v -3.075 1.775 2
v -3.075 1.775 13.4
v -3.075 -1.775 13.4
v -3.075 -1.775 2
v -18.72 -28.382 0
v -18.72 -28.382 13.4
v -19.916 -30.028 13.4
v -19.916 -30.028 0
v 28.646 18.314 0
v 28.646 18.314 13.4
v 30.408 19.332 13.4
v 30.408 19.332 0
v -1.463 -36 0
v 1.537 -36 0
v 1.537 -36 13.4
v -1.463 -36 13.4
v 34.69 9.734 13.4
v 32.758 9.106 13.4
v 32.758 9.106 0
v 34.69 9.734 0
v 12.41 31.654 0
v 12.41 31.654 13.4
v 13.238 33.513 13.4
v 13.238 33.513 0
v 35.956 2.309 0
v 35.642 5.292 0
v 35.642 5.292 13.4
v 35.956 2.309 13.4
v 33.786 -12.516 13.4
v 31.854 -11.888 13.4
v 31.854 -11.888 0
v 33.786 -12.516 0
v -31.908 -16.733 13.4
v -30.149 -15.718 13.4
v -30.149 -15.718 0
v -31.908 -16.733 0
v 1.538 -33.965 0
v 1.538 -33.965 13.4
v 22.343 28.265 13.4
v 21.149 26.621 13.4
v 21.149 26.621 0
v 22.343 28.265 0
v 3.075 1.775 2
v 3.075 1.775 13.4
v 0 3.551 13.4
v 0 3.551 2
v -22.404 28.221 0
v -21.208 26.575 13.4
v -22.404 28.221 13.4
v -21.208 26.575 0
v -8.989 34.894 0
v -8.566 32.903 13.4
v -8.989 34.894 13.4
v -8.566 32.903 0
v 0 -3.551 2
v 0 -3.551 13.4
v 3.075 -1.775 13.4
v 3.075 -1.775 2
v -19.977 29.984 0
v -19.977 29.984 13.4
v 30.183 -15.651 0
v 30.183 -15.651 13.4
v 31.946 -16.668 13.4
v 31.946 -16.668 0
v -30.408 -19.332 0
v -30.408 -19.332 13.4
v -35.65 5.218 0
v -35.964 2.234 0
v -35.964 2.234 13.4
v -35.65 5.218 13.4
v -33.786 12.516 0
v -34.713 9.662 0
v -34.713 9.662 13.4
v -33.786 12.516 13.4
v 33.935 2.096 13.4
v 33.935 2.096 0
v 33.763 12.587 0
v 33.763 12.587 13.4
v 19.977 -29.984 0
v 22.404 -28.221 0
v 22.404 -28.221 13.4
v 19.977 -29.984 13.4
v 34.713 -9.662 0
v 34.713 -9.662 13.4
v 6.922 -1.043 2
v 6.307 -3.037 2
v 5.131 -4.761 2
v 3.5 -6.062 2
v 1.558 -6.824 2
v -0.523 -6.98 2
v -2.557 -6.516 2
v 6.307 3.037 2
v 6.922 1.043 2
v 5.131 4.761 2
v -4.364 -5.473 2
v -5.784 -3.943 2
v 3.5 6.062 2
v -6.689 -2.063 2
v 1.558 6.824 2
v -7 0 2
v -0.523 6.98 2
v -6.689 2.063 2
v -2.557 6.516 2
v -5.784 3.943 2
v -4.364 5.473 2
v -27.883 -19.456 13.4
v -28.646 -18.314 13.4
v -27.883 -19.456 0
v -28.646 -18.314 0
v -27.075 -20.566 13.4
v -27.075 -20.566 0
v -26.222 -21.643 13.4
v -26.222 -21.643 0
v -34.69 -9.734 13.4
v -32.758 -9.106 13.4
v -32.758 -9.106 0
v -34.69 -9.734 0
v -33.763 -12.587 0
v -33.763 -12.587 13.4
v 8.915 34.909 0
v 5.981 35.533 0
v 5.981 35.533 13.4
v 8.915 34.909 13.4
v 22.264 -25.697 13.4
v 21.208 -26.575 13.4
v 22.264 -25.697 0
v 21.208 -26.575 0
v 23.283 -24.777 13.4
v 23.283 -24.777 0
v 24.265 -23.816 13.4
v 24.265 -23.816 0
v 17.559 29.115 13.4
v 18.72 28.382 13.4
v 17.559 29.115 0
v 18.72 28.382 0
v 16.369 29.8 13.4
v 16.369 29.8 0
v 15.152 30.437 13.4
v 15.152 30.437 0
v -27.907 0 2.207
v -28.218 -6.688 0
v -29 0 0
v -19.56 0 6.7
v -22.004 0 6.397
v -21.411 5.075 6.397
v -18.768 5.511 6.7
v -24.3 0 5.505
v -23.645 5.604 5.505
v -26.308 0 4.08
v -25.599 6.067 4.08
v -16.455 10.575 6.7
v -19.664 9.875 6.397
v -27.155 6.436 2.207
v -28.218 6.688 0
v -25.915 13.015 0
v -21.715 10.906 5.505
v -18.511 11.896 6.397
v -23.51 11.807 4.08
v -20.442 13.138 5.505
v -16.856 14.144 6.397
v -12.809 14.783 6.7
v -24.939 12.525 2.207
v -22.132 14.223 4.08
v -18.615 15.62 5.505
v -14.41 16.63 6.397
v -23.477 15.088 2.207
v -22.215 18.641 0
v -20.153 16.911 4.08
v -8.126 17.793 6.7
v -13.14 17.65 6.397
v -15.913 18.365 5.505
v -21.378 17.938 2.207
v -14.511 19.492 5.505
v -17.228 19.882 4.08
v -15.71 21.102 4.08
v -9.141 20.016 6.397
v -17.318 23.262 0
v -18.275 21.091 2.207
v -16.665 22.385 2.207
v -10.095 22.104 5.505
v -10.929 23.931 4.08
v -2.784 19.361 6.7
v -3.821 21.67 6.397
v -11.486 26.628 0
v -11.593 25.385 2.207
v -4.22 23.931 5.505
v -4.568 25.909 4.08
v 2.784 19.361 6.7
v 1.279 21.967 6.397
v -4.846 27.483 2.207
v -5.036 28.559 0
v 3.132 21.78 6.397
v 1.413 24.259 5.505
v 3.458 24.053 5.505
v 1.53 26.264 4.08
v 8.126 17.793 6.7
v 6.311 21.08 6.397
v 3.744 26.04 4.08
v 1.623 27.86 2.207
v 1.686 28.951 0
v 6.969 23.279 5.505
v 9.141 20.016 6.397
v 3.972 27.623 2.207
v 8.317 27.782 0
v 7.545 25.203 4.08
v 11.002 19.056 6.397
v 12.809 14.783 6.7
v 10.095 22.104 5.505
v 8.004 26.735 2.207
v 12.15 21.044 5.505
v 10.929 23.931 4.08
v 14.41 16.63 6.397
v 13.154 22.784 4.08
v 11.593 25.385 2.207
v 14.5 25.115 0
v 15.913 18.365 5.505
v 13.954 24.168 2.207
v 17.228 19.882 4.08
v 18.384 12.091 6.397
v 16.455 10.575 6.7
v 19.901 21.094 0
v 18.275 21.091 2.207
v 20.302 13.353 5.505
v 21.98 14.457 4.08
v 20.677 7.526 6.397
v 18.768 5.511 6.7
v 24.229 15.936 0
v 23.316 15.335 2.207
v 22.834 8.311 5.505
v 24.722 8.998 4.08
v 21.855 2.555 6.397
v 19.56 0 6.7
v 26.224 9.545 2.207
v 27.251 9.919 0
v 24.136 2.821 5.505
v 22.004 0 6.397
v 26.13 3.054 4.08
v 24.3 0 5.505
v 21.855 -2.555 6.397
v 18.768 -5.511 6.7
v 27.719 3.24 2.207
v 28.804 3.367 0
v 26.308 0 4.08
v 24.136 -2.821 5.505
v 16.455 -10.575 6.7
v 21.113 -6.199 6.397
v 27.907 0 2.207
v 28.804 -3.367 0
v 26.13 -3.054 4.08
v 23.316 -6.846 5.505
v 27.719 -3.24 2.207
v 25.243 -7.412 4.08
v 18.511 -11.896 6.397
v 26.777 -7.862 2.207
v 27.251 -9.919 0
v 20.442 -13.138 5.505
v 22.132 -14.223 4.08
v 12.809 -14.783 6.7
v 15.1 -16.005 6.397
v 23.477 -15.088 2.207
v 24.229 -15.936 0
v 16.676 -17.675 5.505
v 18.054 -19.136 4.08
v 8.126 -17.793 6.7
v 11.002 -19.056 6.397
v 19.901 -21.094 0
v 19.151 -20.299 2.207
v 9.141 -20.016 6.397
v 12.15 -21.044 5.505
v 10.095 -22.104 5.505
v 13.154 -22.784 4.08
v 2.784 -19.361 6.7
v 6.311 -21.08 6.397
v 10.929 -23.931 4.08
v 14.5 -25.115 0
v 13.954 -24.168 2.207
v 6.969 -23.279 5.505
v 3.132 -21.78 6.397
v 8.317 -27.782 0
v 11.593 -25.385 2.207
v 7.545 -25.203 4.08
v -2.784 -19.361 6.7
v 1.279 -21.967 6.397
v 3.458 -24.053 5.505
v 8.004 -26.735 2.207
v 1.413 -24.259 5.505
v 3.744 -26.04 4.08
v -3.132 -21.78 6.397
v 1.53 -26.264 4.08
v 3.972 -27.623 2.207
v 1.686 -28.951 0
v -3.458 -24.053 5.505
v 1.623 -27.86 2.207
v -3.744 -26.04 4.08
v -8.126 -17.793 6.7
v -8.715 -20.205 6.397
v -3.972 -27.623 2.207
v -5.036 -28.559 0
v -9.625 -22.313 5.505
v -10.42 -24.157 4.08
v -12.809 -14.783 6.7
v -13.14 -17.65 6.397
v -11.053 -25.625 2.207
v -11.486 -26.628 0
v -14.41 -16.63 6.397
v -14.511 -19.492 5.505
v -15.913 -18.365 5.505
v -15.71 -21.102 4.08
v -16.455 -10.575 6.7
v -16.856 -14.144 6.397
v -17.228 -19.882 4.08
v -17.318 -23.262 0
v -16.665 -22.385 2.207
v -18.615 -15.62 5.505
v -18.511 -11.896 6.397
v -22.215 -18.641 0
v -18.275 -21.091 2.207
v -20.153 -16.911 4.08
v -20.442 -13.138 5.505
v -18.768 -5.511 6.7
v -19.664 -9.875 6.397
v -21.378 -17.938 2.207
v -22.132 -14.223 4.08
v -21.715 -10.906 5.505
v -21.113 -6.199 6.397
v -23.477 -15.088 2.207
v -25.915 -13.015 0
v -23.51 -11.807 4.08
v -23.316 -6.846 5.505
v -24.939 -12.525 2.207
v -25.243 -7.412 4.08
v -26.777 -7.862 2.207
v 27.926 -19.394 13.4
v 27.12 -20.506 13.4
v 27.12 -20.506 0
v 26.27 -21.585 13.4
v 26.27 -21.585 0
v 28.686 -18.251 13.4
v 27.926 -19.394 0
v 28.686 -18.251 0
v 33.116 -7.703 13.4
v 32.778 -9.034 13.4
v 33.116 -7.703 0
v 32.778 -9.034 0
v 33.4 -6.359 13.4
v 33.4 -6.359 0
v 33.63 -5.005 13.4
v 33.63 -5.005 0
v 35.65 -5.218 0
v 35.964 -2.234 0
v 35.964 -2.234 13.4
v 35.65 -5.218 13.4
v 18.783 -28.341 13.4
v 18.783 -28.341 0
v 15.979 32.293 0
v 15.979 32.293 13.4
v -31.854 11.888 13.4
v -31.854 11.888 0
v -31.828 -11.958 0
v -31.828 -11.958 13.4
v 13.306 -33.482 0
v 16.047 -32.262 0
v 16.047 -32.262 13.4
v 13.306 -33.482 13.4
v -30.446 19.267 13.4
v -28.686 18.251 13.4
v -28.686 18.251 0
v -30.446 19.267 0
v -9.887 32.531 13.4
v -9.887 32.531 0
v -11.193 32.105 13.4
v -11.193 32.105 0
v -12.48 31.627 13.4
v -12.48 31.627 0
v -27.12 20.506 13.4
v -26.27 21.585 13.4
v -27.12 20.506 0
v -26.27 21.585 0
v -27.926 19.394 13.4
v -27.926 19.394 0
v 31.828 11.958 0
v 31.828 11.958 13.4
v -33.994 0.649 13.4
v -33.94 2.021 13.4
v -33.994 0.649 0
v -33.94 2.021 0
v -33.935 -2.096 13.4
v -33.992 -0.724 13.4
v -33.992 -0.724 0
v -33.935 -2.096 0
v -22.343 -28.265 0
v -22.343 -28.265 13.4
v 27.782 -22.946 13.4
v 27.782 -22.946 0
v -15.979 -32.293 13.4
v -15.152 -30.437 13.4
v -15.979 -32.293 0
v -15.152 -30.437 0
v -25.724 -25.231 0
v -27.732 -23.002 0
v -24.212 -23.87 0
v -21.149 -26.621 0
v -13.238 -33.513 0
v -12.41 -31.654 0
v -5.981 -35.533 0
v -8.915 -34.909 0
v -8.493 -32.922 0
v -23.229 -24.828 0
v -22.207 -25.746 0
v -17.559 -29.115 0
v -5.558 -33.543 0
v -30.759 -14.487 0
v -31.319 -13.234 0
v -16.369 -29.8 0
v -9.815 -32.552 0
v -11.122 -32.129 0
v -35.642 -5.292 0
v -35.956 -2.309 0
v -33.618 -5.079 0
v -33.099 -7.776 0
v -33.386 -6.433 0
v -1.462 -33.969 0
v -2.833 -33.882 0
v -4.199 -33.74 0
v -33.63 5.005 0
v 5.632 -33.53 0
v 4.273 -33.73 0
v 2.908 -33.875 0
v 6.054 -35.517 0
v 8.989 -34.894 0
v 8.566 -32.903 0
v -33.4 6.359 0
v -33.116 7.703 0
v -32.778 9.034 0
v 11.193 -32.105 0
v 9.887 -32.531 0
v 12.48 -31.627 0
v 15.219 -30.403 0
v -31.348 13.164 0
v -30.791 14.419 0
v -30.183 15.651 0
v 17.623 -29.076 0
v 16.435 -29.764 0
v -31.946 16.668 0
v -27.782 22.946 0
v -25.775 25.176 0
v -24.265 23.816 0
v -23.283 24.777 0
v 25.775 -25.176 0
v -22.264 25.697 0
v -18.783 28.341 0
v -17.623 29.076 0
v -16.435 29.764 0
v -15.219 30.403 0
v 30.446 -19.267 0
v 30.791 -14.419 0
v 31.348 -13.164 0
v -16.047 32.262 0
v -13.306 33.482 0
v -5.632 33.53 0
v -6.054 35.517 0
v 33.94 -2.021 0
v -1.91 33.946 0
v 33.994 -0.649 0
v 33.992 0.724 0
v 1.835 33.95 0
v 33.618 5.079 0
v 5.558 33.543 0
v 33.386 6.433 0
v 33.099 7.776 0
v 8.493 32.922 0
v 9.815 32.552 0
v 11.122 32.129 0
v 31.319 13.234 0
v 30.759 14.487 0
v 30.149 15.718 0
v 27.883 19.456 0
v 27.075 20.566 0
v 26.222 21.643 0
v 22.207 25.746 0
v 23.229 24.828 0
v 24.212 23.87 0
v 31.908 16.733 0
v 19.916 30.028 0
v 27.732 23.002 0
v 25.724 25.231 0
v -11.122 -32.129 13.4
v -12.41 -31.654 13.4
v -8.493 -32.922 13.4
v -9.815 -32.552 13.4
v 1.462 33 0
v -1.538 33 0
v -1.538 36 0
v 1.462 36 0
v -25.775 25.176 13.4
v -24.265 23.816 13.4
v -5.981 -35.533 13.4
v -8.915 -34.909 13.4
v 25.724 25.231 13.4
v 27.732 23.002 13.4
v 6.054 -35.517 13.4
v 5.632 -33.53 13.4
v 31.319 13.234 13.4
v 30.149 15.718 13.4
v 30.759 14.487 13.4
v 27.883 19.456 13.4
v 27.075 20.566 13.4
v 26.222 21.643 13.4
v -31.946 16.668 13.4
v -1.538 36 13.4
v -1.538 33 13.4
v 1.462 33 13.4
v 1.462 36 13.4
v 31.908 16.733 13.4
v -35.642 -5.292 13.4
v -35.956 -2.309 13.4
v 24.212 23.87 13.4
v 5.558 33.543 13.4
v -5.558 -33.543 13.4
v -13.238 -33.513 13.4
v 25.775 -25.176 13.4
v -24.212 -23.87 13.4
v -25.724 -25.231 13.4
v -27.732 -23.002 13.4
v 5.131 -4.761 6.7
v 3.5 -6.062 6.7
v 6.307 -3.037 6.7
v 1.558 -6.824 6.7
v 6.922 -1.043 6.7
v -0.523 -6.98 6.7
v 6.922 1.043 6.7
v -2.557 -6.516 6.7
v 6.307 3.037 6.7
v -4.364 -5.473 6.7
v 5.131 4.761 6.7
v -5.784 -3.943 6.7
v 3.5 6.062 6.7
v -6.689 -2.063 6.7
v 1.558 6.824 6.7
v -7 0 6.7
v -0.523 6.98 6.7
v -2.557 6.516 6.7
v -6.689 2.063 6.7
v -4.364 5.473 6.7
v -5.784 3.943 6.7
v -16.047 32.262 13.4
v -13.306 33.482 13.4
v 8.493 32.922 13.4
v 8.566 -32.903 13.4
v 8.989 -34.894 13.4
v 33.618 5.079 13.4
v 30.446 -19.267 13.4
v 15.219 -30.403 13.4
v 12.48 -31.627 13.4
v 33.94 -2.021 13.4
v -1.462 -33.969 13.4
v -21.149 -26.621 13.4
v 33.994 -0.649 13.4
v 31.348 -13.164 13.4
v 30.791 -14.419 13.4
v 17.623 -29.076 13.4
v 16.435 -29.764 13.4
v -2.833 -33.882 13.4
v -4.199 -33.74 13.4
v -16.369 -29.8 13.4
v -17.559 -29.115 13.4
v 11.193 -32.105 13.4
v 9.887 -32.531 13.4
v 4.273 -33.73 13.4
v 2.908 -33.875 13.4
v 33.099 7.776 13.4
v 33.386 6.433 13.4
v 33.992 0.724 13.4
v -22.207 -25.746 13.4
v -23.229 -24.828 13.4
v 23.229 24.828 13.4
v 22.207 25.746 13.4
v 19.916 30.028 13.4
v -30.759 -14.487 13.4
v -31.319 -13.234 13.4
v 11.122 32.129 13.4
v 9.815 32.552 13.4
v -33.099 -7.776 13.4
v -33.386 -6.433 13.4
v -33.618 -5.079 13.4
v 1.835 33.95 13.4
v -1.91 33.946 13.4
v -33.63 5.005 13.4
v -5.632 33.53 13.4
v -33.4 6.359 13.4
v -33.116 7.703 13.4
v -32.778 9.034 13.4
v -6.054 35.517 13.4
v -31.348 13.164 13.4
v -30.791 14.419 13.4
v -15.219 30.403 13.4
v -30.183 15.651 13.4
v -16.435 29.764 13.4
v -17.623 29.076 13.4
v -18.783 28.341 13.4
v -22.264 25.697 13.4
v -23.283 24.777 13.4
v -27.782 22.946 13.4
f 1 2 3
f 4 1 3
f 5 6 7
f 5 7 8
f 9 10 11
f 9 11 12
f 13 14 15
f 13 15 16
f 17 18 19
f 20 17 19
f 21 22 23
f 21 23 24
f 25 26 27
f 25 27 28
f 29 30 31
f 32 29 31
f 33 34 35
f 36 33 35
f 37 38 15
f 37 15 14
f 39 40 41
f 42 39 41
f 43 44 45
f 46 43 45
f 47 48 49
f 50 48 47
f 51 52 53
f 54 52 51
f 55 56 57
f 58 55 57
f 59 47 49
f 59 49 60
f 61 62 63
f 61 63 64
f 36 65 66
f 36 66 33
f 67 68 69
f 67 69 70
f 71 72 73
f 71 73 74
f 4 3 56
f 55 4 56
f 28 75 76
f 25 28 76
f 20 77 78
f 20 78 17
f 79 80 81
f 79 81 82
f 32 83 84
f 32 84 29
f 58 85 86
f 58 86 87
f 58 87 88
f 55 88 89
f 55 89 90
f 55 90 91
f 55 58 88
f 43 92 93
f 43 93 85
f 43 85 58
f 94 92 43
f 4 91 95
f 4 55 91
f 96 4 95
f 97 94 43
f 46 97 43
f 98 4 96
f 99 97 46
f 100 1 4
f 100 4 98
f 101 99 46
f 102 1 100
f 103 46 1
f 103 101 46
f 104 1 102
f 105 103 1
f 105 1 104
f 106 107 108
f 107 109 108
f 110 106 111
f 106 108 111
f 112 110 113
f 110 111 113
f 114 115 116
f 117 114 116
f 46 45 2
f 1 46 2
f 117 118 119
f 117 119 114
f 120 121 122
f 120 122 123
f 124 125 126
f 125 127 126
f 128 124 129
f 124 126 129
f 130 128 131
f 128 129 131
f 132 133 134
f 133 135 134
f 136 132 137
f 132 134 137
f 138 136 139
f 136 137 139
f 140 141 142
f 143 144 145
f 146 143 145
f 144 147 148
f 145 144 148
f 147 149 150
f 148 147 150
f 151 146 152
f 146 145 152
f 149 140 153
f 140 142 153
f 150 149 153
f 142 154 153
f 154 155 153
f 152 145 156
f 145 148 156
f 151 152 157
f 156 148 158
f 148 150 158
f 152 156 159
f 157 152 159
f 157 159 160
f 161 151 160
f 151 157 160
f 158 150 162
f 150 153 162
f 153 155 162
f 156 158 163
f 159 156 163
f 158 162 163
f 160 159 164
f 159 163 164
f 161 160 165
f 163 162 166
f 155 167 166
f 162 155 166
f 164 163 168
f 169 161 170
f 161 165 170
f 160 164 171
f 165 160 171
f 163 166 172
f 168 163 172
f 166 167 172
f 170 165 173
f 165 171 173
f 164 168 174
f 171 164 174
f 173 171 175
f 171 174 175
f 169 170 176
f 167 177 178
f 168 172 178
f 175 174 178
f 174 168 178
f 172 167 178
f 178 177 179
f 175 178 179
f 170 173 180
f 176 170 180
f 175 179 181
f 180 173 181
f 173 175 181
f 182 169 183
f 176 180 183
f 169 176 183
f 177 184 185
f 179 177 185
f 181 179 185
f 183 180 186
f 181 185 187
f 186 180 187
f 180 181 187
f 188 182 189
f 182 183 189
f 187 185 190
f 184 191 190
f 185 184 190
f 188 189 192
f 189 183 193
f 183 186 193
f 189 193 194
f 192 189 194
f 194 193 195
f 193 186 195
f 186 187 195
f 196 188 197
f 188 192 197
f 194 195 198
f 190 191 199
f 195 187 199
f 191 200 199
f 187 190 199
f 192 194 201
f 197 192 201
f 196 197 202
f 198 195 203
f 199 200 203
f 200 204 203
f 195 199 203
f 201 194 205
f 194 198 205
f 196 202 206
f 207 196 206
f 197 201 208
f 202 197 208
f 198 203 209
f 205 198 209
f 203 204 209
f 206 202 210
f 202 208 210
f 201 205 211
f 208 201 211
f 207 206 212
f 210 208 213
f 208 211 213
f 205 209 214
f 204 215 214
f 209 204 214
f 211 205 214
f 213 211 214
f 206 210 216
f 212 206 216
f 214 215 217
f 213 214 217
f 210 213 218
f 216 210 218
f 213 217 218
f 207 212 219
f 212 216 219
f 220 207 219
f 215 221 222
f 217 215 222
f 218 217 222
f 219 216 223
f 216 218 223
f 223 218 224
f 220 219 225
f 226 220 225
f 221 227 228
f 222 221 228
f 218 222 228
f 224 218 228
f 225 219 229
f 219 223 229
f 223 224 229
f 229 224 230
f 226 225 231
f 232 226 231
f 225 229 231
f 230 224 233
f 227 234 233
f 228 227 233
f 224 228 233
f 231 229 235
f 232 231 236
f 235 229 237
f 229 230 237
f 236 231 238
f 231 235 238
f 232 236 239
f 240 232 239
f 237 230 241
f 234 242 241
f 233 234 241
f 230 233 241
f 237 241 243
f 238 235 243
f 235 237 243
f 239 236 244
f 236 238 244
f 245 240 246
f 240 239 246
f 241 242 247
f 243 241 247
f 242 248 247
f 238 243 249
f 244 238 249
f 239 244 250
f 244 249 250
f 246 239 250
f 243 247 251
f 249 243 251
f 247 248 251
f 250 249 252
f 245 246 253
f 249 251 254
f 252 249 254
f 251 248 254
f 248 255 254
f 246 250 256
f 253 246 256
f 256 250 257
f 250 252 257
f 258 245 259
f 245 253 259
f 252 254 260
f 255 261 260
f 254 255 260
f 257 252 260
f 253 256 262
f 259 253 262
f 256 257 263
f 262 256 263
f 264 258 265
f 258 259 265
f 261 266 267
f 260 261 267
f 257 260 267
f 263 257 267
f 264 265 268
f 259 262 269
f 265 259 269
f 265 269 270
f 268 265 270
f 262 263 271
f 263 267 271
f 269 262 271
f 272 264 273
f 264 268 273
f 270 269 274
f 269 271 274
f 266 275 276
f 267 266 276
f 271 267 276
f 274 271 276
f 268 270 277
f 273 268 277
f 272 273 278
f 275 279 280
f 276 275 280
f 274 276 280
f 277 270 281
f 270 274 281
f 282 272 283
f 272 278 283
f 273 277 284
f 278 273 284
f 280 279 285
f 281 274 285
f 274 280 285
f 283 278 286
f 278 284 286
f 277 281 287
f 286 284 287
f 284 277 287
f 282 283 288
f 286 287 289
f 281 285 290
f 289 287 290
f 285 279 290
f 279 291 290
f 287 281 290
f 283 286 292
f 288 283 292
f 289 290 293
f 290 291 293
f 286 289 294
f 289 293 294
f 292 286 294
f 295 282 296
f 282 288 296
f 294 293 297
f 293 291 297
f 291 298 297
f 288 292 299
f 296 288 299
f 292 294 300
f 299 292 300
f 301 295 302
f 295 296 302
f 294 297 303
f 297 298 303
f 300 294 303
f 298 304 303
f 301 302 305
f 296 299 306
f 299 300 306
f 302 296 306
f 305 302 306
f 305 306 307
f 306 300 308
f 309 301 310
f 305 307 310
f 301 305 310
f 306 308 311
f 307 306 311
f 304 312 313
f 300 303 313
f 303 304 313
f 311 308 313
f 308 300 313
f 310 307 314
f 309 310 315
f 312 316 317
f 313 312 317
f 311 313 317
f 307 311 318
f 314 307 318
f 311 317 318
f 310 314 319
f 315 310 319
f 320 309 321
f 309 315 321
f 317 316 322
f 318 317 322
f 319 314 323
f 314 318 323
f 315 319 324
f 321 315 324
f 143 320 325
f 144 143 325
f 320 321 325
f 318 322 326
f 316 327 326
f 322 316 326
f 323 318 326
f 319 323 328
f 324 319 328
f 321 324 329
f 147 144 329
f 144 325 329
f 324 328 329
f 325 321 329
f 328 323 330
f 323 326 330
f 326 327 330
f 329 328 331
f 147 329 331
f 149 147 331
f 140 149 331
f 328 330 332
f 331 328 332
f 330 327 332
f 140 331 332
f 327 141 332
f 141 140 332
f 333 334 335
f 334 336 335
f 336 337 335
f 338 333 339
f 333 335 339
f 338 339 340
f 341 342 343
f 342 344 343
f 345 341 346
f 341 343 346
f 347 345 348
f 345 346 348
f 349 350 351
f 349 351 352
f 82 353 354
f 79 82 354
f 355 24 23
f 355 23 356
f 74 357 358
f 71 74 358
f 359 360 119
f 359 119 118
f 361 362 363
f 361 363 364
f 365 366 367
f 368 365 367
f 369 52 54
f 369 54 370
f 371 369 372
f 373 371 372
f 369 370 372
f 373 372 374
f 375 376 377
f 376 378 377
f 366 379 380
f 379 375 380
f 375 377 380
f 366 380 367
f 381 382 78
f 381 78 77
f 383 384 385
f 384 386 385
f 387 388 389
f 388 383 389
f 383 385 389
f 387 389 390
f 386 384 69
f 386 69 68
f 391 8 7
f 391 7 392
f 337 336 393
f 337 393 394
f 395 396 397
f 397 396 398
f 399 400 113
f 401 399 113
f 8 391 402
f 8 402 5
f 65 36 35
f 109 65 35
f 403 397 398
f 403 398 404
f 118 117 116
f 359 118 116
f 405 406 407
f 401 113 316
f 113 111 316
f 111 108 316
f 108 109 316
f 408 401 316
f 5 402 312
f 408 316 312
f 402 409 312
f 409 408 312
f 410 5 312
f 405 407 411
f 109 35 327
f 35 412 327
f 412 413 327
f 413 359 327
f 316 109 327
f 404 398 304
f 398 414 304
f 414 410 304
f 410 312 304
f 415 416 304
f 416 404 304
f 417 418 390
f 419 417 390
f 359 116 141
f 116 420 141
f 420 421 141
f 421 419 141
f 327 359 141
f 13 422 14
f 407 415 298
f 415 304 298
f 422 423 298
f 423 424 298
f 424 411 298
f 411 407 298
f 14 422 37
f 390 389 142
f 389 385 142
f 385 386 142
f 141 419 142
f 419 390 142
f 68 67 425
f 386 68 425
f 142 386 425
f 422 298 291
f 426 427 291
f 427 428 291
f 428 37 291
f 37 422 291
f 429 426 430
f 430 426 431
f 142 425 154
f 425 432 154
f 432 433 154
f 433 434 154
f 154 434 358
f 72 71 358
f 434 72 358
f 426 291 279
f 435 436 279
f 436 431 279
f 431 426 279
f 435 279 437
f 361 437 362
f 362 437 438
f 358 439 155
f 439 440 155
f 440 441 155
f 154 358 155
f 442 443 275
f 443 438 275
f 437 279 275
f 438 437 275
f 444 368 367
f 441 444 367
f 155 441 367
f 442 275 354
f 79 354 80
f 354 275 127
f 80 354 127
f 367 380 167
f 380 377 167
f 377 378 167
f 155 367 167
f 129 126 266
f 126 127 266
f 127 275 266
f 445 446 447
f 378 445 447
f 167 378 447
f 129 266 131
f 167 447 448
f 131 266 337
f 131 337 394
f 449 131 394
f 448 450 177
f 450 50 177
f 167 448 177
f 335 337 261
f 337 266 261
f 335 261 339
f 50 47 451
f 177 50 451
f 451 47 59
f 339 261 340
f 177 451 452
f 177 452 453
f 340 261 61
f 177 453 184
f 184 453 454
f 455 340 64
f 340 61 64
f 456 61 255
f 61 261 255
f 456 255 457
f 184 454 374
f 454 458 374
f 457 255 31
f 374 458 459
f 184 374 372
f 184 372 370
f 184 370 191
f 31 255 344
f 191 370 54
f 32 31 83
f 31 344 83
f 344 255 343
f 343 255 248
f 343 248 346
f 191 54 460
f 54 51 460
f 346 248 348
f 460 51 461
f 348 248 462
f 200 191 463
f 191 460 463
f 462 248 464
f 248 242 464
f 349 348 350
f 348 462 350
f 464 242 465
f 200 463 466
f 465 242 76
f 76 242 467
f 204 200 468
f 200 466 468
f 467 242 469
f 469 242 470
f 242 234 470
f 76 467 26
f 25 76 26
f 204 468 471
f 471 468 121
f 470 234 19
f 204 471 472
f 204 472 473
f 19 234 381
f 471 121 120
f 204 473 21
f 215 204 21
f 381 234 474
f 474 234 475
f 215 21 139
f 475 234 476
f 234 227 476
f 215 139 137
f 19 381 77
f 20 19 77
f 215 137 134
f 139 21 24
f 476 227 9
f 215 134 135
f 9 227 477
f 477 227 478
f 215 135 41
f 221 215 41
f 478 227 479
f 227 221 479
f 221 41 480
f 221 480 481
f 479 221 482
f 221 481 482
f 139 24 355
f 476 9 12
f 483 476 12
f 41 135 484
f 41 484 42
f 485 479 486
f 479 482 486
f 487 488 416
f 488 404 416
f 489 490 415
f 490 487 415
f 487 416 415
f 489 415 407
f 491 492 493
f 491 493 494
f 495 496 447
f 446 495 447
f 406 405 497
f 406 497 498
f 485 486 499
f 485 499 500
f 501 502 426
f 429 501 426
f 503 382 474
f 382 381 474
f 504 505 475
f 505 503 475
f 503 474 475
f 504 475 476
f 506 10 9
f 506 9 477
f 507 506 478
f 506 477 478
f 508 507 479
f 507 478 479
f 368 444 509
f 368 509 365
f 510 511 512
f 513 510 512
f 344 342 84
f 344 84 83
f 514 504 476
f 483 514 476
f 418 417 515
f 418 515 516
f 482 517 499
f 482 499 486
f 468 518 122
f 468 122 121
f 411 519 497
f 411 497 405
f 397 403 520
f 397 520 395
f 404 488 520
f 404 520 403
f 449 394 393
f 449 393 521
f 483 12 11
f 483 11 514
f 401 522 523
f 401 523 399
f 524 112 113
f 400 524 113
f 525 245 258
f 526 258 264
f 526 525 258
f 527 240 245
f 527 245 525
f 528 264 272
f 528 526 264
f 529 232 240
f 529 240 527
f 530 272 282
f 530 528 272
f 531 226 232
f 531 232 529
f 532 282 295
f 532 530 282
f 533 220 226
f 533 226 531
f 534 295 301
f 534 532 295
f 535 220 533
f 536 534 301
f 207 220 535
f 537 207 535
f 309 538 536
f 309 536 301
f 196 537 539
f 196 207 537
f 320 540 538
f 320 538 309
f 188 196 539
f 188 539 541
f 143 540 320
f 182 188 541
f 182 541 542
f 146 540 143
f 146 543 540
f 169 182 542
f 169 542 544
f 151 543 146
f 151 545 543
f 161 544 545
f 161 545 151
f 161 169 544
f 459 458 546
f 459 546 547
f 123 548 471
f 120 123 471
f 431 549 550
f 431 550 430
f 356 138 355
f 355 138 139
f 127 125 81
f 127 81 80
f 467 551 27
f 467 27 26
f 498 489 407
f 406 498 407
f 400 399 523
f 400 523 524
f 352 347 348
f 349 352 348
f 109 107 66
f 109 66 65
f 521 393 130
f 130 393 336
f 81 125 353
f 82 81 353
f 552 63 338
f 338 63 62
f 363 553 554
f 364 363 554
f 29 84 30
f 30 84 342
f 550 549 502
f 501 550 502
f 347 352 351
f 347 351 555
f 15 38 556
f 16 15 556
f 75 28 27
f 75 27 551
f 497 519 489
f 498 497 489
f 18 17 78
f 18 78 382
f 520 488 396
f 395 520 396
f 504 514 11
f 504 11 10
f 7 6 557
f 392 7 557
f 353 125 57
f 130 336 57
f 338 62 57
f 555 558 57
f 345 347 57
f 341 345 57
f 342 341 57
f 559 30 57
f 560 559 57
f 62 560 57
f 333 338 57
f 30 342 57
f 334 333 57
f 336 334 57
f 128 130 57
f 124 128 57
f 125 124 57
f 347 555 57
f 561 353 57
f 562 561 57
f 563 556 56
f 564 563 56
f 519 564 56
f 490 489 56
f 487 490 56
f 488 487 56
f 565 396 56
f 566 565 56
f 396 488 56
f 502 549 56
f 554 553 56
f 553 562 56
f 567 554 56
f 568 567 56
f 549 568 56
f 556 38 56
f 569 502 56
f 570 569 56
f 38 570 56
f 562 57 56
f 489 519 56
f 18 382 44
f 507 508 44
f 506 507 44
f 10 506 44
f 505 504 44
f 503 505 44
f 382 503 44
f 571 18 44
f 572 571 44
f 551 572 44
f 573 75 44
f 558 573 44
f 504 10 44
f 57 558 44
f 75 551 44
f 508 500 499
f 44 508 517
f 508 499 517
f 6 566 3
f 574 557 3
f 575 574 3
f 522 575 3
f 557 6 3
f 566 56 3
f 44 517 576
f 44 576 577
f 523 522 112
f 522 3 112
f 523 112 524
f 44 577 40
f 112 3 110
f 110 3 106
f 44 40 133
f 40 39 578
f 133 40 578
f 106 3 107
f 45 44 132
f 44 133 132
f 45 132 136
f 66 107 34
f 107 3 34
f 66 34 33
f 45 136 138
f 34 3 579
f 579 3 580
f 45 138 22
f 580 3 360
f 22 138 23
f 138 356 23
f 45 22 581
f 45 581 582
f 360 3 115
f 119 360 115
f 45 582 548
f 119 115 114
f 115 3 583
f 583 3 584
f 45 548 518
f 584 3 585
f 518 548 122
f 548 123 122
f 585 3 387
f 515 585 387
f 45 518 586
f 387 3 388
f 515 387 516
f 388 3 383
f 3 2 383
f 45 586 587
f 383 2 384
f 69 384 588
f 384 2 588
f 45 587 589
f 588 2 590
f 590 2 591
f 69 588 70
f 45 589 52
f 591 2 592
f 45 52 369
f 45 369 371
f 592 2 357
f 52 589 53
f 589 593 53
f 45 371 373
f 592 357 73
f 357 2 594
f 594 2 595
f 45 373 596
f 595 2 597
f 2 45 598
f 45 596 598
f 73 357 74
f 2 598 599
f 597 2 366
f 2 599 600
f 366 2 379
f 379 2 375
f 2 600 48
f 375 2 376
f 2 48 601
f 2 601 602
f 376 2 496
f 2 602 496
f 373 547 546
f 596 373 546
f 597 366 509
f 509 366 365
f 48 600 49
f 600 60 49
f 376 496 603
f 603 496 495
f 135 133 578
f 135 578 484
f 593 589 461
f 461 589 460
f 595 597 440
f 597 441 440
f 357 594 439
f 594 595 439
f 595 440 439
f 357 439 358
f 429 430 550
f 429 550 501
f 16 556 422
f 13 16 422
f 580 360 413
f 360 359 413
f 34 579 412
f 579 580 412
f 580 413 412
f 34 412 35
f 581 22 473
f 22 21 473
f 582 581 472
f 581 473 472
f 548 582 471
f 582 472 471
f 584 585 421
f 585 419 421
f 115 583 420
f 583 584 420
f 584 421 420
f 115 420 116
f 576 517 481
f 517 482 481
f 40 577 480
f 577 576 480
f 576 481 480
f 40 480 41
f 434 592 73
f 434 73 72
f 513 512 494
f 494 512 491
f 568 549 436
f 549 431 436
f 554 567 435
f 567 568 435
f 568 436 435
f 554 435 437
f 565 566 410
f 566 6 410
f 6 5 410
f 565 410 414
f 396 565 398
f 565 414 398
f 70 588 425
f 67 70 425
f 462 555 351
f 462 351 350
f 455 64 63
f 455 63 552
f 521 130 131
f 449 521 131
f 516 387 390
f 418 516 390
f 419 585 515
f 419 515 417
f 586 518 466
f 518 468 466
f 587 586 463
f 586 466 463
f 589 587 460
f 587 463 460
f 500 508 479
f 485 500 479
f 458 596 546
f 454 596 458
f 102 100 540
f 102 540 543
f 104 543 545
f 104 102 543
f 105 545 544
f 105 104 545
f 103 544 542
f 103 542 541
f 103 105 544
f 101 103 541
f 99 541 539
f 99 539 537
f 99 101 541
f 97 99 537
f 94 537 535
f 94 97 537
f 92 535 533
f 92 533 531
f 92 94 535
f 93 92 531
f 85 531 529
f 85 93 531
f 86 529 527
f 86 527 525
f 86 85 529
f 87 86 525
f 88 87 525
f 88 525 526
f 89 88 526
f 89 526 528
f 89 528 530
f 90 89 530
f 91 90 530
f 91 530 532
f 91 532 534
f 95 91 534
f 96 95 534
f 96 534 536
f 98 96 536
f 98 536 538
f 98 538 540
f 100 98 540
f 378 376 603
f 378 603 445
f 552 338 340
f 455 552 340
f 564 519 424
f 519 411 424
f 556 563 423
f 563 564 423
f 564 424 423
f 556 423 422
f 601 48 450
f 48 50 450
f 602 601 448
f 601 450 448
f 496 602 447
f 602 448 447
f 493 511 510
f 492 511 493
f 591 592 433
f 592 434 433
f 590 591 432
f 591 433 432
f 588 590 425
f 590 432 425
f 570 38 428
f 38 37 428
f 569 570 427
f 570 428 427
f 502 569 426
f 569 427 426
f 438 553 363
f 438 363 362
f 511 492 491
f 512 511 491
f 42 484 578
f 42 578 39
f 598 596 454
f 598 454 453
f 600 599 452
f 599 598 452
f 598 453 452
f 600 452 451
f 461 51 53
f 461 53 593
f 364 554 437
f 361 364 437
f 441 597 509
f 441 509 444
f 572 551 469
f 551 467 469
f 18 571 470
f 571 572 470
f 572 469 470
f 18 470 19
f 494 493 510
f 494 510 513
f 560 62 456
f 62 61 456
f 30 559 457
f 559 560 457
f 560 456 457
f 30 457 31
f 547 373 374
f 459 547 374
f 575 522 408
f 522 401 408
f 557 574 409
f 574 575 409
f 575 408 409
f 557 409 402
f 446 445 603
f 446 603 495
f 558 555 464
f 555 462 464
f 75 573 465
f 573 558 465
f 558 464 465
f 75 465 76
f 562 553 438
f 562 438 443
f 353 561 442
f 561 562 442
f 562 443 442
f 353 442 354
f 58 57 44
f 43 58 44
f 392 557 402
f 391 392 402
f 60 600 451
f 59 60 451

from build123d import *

# Parameters (mm, degrees)
SKETCH1_R           = 34
BOSS_EXTRUDE1_DEPTH = 13.4
CUT_EXTRUDE1_REACH  = 51.916
BOSS_EXTRUDE3_START = 33
SKETCH9_W           = 3
SKETCH9_H           = 13.4
BOSS_EXTRUDE3_DEPTH = 3
CIRPATTERN11_COUNT  = 30
SKETCH12_R          = 29
SKETCH12_R_2        = 7
CUT_EXTRUDE6_DEPTH  = 6.7
SKETCH14_R          = 7.869119163
CUT_EXTRUDE7_DEPTH  = 2
FILLET1_R           = 10


with BuildPart() as part:
    # Sketch1 → Boss-Extrude1 (new body)
    with BuildSketch(Plane.XY):
        Circle(SKETCH1_R)
    extrude(amount=BOSS_EXTRUDE1_DEPTH)

    # Sketch2 → Cut-Extrude1 (cut, up to next)
    with BuildSketch(Plane.XY.offset(13.4), mode=Mode.PRIVATE) as cut_extrude1_sk1:
        Polygon((0, -3.550704156), (3.075, -1.775352078), (3.075, 1.775352078), (0, 3.550704156), (-3.075, 1.775352078), (-3.075, -1.775352078), align=None)
    cut_extrude1_tool1 = extrude(cut_extrude1_sk1.sketch, amount=-CUT_EXTRUDE1_REACH, mode=Mode.PRIVATE) & part.part
    add(cut_extrude1_tool1.solids().sort_by_distance((0, 0, 13.4))[0], mode=Mode.SUBTRACT)


with BuildPart() as body_2:
    # Sketch9 → Boss-Extrude3 (new body)
    with BuildSketch(Plane(origin=(0, 0, 0), x_dir=(1, 0, 0), z_dir=(0, 1, 0)).offset(BOSS_EXTRUDE3_START)):
        with Locations((-0.0375, -6.7)):
            Rectangle(SKETCH9_W, SKETCH9_H)
    boss_extrude3 = extrude(amount=BOSS_EXTRUDE3_DEPTH)


with BuildPart() as part_1:
    add(part.part)

    # CirPattern11: Boss-Extrude3 ×30 about axis
    cirpattern11_axis = Axis((0, 0, 0), (0, 0, 1))
    for i in range(1, CIRPATTERN11_COUNT):
        add(boss_extrude3.rotate(cirpattern11_axis, i * 360 / CIRPATTERN11_COUNT))

    # Sketch12 → Cut-Extrude6 (cut)
    with BuildSketch(Plane(origin=(0, 0, 0), x_dir=(-1, 0, 0), z_dir=(0, 0, -1))):
        Circle(SKETCH12_R)
        Circle(SKETCH12_R_2, mode=Mode.SUBTRACT)
    extrude(amount=-CUT_EXTRUDE6_DEPTH, mode=Mode.SUBTRACT)

    # Sketch14 → Cut-Extrude7 (cut)
    with BuildSketch(Plane(origin=(0, 0, 0), x_dir=(-1, 0, 0), z_dir=(0, 0, -1))):
        Circle(SKETCH14_R)
    extrude(amount=-CUT_EXTRUDE7_DEPTH, mode=Mode.SUBTRACT)

    # Fillet1
    # the kernel refuses this fillet: 10 mm, written as the material it adds along each edge
    with BuildSketch(Plane(origin=(0, 0, 6.7), x_dir=(-1, 0, 0), z_dir=(0, -1, 0))) as fillet1_piece_1:
        with BuildLine():
            CenterArc((19.56019068, 10), FILLET1_R, 270, 70.731224509)
            Line((19.56019068, 0), (19.56019068, -0.2))
            Line((19.56019068, -0.2), (29, -0.2))
            Line((29, -0.2), (29.2, 0))
            ThreePointArc((29.2, 0), (29.2, 3.35), (29.188796186, 6.634))
            Line((29.188796186, 6.634), (29, 6.7))
        make_face()
    revolve(axis=Axis((0, 0, 6.7), (0, 0, -1)))


solid = Compound([body_2.part, part_1.part])
